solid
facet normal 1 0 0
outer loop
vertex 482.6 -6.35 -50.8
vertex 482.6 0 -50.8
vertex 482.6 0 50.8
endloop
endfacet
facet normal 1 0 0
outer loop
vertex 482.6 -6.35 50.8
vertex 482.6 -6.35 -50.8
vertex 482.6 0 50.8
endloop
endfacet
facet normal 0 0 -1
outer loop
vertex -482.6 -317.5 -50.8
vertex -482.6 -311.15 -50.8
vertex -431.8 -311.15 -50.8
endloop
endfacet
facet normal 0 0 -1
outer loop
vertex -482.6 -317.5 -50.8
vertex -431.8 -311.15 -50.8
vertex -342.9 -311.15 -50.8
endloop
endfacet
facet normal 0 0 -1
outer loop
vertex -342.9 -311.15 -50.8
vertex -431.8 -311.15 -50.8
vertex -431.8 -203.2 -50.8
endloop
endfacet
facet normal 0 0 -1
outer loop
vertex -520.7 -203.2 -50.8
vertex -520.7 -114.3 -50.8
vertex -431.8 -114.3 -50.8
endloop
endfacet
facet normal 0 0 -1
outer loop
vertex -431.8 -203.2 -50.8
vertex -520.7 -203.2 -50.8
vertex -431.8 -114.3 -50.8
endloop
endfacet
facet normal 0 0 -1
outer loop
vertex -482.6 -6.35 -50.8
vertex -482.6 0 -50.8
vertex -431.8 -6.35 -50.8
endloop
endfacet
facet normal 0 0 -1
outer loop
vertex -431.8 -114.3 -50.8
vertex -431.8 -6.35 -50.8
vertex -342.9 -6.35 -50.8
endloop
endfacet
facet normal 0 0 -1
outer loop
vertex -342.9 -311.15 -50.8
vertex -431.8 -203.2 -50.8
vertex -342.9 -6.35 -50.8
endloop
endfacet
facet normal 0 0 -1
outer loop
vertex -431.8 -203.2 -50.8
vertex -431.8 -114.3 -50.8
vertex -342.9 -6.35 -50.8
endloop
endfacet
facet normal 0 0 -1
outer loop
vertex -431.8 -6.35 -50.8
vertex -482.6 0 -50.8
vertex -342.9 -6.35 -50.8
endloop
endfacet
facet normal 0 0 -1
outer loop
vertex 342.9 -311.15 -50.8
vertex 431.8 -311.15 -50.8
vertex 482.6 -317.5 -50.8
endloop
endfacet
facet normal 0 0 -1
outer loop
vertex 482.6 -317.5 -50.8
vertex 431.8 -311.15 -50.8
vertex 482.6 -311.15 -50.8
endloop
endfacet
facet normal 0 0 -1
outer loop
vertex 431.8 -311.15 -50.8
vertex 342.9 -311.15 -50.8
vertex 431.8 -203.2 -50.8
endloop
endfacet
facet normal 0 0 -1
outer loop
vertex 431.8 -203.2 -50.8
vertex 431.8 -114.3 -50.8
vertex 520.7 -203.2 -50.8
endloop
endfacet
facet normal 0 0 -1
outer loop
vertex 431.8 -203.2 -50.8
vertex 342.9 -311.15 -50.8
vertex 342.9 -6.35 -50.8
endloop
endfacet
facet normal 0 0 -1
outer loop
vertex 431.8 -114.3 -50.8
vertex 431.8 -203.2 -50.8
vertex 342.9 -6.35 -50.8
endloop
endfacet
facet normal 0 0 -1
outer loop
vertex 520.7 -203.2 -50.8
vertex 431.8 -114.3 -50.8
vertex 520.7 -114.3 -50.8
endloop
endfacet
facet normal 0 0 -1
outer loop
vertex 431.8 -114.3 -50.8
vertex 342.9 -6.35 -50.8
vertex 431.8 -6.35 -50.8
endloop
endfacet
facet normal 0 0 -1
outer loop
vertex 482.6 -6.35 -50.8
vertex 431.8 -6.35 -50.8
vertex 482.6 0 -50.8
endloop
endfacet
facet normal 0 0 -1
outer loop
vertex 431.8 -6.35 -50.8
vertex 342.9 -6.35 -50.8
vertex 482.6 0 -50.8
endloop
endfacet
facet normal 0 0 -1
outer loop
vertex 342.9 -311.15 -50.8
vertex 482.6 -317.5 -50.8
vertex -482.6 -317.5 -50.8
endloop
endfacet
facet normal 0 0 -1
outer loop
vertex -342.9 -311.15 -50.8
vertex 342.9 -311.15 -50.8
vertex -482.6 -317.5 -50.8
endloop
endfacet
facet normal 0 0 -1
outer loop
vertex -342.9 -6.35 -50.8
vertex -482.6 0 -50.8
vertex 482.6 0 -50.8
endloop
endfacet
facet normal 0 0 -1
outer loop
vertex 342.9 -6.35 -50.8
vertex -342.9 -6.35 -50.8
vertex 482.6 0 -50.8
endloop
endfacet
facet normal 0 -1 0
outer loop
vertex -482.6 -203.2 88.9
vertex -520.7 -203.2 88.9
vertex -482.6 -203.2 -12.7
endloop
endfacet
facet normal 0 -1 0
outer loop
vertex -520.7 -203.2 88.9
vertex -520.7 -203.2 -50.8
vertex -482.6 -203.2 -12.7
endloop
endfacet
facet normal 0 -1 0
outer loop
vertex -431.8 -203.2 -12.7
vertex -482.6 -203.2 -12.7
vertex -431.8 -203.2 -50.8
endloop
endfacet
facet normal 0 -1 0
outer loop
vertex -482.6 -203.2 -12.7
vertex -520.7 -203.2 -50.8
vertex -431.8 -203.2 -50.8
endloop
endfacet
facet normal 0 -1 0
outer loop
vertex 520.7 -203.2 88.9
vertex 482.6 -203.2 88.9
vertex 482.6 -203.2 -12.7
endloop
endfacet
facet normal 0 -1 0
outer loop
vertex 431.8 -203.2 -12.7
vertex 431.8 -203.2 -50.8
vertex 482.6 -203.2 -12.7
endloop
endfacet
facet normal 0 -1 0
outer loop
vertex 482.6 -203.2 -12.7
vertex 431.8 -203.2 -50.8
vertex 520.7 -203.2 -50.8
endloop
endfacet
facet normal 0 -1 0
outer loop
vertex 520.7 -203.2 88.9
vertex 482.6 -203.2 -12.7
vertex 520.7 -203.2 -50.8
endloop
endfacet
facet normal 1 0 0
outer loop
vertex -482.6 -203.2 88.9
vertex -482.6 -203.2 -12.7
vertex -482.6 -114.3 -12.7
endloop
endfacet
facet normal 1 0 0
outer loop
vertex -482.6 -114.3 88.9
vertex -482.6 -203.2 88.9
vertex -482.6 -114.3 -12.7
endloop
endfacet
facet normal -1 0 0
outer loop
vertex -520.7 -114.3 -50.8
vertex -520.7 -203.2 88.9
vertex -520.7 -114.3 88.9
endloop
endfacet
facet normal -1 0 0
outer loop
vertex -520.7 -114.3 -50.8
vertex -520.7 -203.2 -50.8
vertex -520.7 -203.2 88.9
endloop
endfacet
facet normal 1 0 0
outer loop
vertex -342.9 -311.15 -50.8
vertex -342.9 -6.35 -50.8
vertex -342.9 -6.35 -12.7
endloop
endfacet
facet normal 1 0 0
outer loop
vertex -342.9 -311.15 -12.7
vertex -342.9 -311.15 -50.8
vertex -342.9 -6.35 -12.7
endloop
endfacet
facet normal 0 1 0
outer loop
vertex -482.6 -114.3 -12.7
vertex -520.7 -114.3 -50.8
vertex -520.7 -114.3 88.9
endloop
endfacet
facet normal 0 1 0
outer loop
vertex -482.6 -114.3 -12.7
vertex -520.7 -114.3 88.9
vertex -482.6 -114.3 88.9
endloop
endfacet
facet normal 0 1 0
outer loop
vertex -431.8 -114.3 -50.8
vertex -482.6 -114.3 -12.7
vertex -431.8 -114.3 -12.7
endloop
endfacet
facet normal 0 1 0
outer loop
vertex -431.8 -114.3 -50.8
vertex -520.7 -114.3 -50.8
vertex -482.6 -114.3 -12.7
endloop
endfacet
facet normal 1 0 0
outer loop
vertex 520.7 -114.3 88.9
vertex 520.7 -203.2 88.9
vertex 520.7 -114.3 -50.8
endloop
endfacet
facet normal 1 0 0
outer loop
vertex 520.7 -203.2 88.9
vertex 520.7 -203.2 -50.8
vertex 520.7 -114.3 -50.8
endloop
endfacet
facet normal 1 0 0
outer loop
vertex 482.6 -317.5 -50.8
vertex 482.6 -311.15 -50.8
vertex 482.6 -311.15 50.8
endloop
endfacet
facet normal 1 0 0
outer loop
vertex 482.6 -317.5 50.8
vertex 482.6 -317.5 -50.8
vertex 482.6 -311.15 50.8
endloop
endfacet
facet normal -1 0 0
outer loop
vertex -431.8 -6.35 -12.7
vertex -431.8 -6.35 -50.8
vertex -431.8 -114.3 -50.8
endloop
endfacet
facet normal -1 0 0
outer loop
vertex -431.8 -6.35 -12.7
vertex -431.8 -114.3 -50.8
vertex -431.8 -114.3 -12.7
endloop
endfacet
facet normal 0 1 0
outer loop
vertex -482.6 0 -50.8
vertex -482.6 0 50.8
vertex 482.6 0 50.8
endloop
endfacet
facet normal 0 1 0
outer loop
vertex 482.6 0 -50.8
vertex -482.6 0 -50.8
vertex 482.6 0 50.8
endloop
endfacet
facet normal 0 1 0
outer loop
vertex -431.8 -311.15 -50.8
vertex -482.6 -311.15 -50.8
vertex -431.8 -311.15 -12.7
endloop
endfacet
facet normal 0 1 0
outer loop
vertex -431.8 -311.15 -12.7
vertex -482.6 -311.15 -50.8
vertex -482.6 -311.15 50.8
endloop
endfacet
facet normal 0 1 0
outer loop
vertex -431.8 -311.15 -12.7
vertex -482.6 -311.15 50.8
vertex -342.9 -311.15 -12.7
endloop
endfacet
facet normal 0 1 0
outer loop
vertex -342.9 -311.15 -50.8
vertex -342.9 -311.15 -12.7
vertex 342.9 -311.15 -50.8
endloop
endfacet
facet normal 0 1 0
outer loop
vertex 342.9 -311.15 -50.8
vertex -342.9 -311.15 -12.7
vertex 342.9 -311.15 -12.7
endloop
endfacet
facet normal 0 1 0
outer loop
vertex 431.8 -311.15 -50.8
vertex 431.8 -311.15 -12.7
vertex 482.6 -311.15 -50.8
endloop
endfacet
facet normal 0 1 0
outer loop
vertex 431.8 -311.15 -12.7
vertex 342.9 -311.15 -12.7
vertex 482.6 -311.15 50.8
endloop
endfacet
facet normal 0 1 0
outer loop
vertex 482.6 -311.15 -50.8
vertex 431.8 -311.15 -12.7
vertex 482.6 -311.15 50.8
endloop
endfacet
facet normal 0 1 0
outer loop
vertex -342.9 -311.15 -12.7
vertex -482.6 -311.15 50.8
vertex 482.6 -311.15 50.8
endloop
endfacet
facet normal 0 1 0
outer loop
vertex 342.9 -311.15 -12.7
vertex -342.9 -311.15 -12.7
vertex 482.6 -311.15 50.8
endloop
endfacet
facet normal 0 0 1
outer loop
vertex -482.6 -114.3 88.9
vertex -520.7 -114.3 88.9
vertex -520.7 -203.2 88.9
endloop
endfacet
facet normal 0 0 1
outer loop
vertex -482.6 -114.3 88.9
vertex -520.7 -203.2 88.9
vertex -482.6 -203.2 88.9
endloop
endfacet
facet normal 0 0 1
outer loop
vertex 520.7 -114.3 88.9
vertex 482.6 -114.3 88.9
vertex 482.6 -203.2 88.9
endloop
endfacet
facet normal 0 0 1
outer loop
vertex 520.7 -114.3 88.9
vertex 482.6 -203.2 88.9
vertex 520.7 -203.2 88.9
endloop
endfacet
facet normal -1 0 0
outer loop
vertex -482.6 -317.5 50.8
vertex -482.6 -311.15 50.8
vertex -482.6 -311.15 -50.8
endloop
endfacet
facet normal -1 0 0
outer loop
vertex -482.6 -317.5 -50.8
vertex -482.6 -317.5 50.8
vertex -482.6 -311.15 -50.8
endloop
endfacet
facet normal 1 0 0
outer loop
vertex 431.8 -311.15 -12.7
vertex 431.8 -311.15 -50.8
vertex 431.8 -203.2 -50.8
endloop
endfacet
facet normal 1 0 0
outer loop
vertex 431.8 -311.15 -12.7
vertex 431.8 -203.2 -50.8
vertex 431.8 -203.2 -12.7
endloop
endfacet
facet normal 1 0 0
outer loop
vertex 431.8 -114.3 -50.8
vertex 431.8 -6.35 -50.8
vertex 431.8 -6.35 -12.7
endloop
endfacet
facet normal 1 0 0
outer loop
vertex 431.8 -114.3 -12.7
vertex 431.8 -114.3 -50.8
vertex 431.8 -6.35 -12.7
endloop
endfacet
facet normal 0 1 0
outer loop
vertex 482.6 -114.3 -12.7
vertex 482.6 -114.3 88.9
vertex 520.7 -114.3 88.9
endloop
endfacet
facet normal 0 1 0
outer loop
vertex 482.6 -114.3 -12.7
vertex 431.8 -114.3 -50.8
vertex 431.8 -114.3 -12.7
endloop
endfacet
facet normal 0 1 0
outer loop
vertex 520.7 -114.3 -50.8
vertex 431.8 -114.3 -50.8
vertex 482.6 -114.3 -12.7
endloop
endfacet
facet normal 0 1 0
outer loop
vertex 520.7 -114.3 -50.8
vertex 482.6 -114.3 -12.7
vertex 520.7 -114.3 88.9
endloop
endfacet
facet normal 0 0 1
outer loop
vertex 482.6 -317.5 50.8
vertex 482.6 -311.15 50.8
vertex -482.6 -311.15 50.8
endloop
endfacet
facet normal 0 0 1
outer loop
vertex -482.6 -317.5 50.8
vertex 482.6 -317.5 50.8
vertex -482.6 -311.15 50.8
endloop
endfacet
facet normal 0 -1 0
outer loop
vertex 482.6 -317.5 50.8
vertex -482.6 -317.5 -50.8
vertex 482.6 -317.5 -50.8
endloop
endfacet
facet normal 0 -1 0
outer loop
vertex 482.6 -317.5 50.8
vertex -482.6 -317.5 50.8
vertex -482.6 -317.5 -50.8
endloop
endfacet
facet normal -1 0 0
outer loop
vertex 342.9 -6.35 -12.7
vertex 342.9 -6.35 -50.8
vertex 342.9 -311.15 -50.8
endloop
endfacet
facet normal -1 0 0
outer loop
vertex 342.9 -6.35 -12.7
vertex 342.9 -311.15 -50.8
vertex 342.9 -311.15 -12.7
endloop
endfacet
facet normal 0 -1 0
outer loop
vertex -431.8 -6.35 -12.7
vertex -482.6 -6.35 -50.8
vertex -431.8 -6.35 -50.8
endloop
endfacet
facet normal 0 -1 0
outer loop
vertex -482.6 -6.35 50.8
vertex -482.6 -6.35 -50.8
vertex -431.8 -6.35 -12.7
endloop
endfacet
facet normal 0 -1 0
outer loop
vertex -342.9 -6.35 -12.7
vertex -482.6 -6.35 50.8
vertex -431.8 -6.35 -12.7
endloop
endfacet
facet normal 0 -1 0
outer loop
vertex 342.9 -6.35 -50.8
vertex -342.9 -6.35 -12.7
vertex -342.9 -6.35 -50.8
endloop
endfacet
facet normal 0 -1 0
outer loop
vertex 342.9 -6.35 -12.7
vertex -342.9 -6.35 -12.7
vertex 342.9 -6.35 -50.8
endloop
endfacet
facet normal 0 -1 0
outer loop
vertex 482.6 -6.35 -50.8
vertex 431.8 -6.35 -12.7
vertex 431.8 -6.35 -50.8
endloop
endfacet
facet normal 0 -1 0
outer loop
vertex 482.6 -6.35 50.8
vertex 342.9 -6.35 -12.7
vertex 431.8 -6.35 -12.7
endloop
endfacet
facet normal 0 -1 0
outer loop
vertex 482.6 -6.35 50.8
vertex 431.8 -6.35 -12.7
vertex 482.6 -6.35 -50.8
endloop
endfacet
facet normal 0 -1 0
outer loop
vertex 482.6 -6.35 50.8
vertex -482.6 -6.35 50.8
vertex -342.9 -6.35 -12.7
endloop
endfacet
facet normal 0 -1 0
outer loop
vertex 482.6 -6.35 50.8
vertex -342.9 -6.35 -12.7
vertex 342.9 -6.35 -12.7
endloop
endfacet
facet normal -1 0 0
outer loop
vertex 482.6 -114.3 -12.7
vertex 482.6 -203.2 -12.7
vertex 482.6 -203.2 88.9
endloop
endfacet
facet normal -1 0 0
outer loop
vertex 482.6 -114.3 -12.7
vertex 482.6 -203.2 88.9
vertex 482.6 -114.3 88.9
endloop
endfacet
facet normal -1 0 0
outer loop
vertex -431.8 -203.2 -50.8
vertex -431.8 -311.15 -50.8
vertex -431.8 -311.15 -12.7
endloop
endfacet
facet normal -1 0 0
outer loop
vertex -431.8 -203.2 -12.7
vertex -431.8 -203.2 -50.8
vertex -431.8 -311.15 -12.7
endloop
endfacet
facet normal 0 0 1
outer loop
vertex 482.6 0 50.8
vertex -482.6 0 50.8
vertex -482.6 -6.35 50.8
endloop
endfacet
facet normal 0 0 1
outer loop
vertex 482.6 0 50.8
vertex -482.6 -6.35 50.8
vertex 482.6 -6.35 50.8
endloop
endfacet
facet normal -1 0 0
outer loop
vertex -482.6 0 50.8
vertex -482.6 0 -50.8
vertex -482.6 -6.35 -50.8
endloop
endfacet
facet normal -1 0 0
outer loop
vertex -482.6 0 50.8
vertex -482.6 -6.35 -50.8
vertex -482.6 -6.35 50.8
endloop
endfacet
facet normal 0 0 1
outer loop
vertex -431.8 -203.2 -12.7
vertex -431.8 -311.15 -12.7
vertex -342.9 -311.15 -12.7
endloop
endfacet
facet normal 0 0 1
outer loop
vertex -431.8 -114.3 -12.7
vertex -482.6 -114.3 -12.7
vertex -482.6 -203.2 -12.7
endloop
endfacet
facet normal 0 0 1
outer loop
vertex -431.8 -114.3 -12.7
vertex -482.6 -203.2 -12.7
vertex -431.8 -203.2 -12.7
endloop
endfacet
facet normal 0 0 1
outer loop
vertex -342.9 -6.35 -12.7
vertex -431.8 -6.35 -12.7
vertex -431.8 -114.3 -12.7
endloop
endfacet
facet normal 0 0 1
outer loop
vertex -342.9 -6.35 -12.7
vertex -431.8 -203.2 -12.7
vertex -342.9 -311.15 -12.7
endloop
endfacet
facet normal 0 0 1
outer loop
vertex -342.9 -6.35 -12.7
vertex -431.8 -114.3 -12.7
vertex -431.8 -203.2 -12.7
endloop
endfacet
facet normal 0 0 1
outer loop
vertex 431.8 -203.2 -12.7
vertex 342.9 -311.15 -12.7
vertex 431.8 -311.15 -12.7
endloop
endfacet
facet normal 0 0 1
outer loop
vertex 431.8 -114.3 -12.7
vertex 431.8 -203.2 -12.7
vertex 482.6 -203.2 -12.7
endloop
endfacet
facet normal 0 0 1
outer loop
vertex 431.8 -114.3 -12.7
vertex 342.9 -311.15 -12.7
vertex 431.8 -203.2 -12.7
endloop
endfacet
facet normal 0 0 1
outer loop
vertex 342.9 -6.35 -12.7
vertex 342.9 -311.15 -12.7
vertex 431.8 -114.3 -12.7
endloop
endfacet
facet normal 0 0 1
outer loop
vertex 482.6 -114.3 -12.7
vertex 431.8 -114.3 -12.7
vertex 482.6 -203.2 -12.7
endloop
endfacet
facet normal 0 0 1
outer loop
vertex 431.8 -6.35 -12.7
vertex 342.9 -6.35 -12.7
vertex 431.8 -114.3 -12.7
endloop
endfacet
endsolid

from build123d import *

# Parameters (mm, degrees)
F0_W      = 965.2
F0_H      = 101.6
F1_DEPTH  = 6.35
F2_W      = 88.9
F2_H      = 38.1
F3_DEPTH  = 304.8
F4_W      = 88.9
F4_H      = 38.1
F5_DEPTH  = 88.9
F6_W      = 38.1
F6_H      = 88.9
F7_DEPTH  = 101.6
F8_W      = 88.9
F8_H      = 38.1
F9_DEPTH  = 88.9
F10_W     = 38.1
F10_H     = 88.9
F11_DEPTH = 101.6
F13_DEPTH = 6.35


with BuildPart() as f1:
    # F0 (on Front) → F1 (new body)
    with BuildSketch(Plane.XZ):
        Rectangle(F0_W, F0_H)
    extrude(amount=F1_DEPTH)

    # F2 (on face) → F3 (join)
    with BuildSketch(Plane.XZ.offset(6.35)):
        with Locations((-387.35, -31.75)):
            Rectangle(F2_W, F2_H)
        with Locations((387.35, -31.75)):
            Rectangle(F2_W, F2_H)
    extrude(amount=F3_DEPTH)

    # F4 (on face) → F5 (join)
    with BuildSketch(Plane(origin=(-431.8, 0, 0), x_dir=(0, -1, 0), z_dir=(-1, 0, 0))):
        with Locations((158.75, -31.75)):
            Rectangle(F4_W, F4_H)
    extrude(amount=F5_DEPTH)

    # F6 (on face) → F7 (join)
    with BuildSketch(Plane.XY.offset(-12.7)):
        with Locations((-501.65, -158.75)):
            Rectangle(F6_W, F6_H)
    extrude(amount=F7_DEPTH)

    # F8 (on face) → F9 (join)
    with BuildSketch(Plane.YZ.offset(431.8)):
        with Locations((-158.75, -31.75)):
            Rectangle(F8_W, F8_H)
    extrude(amount=F9_DEPTH)

    # F10 (on face) → F11 (join)
    with BuildSketch(Plane.XY.offset(-12.7)):
        with Locations((501.65, -158.75)):
            Rectangle(F10_W, F10_H)
    extrude(amount=F11_DEPTH)

    # F12 (on face) → F13 (join)
    with BuildSketch(Plane.XZ.offset(311.15)):
        Polygon((-482.6, -50.8), (-431.8, -50.8), (482.6, -50.8), (482.6, 50.8), (-482.6, 50.8), align=None)
    extrude(amount=F13_DEPTH)


solid = f1.part
